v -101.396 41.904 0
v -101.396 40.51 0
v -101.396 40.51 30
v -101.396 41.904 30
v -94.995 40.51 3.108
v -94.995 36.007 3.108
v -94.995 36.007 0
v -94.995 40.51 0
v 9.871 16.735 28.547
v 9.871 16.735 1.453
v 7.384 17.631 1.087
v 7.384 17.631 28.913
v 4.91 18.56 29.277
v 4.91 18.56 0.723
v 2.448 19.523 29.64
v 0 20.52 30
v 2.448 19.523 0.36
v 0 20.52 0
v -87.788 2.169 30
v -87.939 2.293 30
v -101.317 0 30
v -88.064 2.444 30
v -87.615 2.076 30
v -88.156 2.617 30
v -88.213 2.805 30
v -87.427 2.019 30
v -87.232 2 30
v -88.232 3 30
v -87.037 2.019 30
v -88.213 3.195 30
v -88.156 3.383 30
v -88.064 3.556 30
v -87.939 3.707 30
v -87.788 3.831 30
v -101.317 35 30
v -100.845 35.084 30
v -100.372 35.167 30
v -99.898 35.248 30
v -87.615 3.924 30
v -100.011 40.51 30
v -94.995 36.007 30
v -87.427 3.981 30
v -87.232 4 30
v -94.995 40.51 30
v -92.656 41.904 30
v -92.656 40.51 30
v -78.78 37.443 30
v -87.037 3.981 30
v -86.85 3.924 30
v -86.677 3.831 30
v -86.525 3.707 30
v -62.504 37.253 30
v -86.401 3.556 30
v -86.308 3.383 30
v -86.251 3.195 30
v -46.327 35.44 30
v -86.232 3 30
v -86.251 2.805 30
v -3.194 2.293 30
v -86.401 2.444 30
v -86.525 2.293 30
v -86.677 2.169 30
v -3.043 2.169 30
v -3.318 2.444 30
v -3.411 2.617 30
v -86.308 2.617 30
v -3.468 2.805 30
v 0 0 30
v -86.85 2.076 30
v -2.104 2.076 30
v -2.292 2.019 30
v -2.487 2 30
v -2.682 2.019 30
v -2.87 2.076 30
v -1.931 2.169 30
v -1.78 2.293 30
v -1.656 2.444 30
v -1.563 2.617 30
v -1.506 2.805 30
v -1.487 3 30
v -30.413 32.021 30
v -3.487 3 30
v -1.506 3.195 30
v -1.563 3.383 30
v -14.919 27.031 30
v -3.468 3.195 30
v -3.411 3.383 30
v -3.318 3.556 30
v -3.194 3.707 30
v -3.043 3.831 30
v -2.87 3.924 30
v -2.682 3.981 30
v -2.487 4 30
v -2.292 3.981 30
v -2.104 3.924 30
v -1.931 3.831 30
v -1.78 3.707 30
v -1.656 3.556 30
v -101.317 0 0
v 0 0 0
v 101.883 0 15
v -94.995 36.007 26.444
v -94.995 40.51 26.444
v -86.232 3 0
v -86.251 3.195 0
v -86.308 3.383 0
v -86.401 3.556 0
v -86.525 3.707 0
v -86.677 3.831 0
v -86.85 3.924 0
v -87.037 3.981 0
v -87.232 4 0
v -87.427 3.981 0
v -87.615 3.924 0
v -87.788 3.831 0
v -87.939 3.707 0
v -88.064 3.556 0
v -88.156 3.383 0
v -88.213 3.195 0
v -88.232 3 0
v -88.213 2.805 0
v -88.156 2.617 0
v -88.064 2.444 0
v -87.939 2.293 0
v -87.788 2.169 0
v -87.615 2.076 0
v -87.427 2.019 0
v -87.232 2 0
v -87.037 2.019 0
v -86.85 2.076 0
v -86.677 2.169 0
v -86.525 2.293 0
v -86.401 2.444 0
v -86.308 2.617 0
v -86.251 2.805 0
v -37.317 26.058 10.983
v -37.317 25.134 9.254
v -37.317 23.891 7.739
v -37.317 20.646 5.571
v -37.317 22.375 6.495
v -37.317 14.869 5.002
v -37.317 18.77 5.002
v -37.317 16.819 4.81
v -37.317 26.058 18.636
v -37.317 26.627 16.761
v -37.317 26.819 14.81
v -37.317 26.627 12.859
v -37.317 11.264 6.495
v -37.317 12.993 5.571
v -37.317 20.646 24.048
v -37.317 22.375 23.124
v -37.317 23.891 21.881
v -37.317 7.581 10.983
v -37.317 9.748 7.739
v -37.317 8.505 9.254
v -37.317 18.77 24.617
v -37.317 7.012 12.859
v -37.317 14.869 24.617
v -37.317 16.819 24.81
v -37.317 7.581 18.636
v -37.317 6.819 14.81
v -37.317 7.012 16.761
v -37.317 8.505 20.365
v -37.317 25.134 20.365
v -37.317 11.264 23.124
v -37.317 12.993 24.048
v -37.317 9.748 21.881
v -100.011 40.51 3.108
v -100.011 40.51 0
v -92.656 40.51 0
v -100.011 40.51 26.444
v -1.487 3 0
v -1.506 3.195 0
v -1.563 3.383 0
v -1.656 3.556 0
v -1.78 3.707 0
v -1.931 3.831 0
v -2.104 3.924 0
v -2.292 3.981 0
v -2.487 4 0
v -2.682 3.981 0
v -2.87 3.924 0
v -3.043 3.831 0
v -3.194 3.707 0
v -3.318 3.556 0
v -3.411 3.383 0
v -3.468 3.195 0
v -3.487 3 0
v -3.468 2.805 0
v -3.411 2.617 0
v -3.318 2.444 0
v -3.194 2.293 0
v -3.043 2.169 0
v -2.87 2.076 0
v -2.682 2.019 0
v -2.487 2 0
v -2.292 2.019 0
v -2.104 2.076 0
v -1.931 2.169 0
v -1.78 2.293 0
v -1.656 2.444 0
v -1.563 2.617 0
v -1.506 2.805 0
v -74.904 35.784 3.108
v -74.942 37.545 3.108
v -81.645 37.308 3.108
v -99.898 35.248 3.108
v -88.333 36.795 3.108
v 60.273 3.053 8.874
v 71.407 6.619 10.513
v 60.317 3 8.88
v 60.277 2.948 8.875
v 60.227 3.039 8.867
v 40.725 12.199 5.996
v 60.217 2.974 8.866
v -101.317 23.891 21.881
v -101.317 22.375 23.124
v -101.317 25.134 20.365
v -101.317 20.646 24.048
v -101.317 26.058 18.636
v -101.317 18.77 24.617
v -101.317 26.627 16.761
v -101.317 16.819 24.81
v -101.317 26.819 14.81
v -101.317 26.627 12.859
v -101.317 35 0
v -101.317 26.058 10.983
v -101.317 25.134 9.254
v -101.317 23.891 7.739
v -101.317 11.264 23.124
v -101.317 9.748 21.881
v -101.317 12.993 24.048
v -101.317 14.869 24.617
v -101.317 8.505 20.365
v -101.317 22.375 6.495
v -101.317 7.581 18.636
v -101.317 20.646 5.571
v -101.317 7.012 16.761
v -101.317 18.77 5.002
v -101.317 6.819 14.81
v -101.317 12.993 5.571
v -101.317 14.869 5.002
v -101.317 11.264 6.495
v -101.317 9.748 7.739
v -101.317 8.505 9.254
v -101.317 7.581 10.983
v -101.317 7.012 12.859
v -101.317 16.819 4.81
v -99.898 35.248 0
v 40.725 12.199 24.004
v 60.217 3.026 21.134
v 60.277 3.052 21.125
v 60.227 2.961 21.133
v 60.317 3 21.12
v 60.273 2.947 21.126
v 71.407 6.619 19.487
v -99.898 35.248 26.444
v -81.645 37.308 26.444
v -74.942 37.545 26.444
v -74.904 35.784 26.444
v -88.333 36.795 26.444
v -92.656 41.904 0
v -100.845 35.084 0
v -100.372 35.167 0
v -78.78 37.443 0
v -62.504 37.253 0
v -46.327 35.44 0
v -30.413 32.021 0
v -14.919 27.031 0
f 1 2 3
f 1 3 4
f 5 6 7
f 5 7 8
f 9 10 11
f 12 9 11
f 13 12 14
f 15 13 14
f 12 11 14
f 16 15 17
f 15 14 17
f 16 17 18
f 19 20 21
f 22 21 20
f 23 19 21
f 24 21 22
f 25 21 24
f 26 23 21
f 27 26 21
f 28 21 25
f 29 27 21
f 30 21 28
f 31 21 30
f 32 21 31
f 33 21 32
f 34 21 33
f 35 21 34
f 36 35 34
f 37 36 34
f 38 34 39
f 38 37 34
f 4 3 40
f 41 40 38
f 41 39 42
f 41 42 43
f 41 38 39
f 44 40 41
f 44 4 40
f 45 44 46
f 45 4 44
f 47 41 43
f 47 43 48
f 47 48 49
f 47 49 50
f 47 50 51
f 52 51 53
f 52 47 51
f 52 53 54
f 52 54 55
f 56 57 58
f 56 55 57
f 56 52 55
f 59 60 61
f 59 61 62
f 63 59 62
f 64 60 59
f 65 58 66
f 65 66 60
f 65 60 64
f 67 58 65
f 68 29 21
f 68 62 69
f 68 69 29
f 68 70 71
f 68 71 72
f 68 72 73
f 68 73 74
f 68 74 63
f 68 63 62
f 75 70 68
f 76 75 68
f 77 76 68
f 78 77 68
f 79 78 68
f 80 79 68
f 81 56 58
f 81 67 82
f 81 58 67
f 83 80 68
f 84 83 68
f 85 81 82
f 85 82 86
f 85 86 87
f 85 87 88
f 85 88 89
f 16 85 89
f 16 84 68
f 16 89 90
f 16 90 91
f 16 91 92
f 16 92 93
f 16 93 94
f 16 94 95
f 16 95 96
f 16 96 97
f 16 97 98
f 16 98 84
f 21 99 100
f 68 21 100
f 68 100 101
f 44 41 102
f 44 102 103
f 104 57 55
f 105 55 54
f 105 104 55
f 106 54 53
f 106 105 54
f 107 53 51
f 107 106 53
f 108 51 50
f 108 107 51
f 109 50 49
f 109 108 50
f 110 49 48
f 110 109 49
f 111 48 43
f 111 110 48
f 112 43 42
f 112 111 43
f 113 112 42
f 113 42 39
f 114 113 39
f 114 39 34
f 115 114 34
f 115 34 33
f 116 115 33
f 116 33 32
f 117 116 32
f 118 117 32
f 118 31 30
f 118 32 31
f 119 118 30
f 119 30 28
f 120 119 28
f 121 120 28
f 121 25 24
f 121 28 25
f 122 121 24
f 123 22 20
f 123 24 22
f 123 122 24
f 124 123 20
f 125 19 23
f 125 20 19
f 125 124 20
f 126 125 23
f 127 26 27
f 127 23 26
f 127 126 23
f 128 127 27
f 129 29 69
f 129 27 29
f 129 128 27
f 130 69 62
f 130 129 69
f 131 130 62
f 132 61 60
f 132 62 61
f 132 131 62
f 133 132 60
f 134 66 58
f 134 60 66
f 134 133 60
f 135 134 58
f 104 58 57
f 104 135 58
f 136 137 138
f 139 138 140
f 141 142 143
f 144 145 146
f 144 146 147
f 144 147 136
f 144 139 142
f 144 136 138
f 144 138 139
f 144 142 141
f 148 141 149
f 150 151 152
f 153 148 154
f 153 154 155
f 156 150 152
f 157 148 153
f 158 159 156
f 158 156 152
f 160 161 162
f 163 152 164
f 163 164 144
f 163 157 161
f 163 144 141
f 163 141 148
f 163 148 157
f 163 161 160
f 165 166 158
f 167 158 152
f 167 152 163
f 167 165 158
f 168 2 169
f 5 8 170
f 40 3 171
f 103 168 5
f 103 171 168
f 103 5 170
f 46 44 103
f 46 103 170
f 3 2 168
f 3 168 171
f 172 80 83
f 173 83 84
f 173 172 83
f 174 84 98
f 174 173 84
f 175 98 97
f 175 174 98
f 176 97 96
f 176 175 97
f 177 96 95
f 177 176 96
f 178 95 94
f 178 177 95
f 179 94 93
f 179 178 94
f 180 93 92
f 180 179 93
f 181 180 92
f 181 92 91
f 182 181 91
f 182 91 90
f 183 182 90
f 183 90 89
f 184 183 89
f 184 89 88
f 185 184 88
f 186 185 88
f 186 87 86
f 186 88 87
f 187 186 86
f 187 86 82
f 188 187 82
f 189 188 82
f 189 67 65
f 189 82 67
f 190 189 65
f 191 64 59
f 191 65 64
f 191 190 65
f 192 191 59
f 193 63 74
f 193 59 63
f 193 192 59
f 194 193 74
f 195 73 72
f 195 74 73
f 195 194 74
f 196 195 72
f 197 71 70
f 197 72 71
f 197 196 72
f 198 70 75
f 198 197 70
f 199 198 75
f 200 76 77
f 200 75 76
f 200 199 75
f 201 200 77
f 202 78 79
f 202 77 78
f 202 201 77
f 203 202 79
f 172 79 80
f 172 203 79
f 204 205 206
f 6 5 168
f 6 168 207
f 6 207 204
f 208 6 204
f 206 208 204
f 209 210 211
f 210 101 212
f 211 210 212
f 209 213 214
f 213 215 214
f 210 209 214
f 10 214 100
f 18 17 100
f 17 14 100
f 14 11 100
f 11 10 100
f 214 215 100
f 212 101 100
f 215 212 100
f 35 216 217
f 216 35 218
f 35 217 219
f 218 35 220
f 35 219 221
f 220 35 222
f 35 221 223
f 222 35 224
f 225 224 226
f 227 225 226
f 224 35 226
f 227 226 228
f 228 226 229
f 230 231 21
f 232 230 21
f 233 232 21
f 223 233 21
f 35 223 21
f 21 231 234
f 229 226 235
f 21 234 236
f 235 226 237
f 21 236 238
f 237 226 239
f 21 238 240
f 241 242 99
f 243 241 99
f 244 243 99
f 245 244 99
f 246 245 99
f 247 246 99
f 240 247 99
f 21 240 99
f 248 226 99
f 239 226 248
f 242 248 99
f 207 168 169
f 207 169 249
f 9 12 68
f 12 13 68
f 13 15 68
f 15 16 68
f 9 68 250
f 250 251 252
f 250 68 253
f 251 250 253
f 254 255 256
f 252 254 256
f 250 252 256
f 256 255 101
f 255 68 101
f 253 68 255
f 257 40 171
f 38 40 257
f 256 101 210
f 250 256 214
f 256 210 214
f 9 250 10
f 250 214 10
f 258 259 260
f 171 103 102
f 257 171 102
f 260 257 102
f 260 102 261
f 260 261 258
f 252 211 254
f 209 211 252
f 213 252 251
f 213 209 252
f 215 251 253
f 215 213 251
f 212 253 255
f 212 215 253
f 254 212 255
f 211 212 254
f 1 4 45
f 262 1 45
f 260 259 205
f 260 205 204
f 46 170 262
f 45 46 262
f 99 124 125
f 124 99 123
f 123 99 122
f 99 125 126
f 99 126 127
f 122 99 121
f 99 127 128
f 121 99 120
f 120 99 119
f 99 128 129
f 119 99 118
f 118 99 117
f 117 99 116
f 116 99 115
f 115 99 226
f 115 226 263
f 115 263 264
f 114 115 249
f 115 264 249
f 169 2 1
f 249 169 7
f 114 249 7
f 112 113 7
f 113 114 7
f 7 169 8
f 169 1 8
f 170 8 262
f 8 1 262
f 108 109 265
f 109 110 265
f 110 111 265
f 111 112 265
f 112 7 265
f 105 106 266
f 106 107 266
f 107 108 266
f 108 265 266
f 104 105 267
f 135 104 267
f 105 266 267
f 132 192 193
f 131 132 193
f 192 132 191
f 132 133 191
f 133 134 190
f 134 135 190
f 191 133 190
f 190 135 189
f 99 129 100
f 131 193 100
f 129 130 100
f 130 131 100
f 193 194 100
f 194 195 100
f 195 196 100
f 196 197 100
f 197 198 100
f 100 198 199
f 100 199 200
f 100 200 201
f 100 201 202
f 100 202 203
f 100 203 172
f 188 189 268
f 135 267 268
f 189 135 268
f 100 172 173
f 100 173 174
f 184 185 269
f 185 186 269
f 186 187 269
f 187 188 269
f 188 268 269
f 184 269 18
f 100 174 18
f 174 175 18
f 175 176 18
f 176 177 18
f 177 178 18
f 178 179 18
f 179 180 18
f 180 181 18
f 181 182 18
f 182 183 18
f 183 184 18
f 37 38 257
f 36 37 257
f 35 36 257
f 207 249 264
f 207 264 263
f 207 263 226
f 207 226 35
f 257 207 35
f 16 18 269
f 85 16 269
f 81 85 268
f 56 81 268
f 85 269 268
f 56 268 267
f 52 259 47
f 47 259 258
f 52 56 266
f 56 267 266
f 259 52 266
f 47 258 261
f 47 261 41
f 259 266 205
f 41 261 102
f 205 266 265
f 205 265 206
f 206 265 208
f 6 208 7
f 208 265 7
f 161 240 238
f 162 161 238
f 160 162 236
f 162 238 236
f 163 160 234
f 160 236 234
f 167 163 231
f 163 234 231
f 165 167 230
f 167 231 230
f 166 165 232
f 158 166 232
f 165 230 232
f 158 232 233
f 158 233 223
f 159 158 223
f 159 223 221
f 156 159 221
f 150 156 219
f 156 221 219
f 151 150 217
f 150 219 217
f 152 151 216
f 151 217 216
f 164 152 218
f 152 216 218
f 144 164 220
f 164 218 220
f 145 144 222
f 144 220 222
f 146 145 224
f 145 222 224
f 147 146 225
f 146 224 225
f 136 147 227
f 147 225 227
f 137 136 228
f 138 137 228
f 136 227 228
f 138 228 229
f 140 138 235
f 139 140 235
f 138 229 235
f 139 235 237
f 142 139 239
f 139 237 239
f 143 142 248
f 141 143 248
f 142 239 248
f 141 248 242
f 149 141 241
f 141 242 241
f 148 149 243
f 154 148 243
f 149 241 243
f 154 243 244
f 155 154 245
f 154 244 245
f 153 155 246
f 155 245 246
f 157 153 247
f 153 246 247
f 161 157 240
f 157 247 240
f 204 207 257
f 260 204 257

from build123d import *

# Parameters (mm, degrees)
F1_DEPTH  = 30
F2_R      = 1
F2_R_2    = 0.0533765033
F3_DEPTH  = 30.001
F4_R      = 10
F5_DEPTH  = 64
F8_DEPTH  = 30
F9_W      = 5.2633735355
F9_H      = 23.3362393919
F10_DEPTH = 25
F11_W     = 8.7402192639
F11_H     = 1.3938806951
F12_DEPTH = 30
F13_DEPTH = 41.9052980466


with BuildPart() as f1:
    # F0 (on Top) → F1 (new body)
    with BuildSketch(Plane.XY):
        with BuildLine():
            Line((-101.3173758984, 35), (-101.3173758984, 0))
            Line((-101.3173758984, 0), (101.8826241016, 0))
            ThreePointArc((101.8826241016, 0), (56.0897429361, 9.5394690074), (9.8705293288, 16.7348653069))
            ThreePointArc((9.8705293288, 16.7348653069), (4.9096577711, 18.5604467569), (0, 20.5195932071))
            ThreePointArc((0, 20.5195932071), (-49.491894157, 35.9236891605), (-101.3173758984, 35))
        make_face()
    extrude(amount=F1_DEPTH)

    # F2 (on Top) → F3 (cut, through all)
    with BuildSketch(Plane.XY):
        with Locations((-87.232263687, 3)):
            Circle(F2_R)
        with Locations((60.264059, 3)):
            Circle(F2_R_2)
        with Locations((-2.4870128836, 3)):
            Circle(F2_R)
    extrude(amount=F3_DEPTH, mode=Mode.SUBTRACT)

    # F4 (on face) → F5 (cut)
    with BuildSketch(Plane(origin=(-101.3173758984, 0, 0), x_dir=(0, -1, 0), z_dir=(-1, 0, 0))):
        with Locations((-16.8194788357, 14.8095988691)):
            Circle(F4_R)
    extrude(amount=-F5_DEPTH, mode=Mode.SUBTRACT)

    # F7 (on face) → F8 (join)
    with BuildSketch(Plane.XY.offset(30)):
        with BuildLine():
            Line((-100.0109697279, 40.5104173515), (-99.8982514965, 35.248250918))
            add(Edge.make_bspline(
                [(-99.8982514965, 35.248250918), (-99.1698783521, 35.2086363528), (-95.596989963, 35.7161657204), (-94.9947075015, 36.0070484152)],
                knots=[0, 0, 0, 0, 4.9619066248, 4.9619066248, 4.9619066248, 4.9619066248], degree=3))
            Line((-94.9947075015, 36.0070484152), (-94.9947075015, 40.5104173515))
            Line((-94.9947075015, 40.5104173515), (-100.0109697279, 40.5104173515))
        make_face()
    extrude(amount=-F8_DEPTH)

    # F9 (on face) → F10 (cut)
    with BuildSketch(Plane(origin=(-99.0977465794, -2.122723191, 0), x_dir=(0.0214155865, -0.99977066, 0), z_dir=(-0.99977066, -0.0214155865, 0))):
        with Locations((-40.0112335009, 14.7758348612)):
            Rectangle(F9_W, F9_H)
    extrude(amount=-F10_DEPTH, mode=Mode.SUBTRACT)

    # F11 (on face) → F12 (join)
    with BuildSketch(Plane.XY.offset(30)):
        with Locations((-97.0257730341, 41.2073576991)):
            Rectangle(F11_W, F11_H)
    extrude(amount=-F12_DEPTH)

    # F6 (on face) → F13 (cut, through all)
    with BuildSketch(Plane.XZ):
        Polygon((0, 30), (101.8826241016, 15), (101.8826241016, 30), align=None)
        Polygon((101.8826241016, 15), (0, 0), (101.8826241016, 0), align=None)
    extrude(amount=-F13_DEPTH, mode=Mode.SUBTRACT)


solid = f1.part
